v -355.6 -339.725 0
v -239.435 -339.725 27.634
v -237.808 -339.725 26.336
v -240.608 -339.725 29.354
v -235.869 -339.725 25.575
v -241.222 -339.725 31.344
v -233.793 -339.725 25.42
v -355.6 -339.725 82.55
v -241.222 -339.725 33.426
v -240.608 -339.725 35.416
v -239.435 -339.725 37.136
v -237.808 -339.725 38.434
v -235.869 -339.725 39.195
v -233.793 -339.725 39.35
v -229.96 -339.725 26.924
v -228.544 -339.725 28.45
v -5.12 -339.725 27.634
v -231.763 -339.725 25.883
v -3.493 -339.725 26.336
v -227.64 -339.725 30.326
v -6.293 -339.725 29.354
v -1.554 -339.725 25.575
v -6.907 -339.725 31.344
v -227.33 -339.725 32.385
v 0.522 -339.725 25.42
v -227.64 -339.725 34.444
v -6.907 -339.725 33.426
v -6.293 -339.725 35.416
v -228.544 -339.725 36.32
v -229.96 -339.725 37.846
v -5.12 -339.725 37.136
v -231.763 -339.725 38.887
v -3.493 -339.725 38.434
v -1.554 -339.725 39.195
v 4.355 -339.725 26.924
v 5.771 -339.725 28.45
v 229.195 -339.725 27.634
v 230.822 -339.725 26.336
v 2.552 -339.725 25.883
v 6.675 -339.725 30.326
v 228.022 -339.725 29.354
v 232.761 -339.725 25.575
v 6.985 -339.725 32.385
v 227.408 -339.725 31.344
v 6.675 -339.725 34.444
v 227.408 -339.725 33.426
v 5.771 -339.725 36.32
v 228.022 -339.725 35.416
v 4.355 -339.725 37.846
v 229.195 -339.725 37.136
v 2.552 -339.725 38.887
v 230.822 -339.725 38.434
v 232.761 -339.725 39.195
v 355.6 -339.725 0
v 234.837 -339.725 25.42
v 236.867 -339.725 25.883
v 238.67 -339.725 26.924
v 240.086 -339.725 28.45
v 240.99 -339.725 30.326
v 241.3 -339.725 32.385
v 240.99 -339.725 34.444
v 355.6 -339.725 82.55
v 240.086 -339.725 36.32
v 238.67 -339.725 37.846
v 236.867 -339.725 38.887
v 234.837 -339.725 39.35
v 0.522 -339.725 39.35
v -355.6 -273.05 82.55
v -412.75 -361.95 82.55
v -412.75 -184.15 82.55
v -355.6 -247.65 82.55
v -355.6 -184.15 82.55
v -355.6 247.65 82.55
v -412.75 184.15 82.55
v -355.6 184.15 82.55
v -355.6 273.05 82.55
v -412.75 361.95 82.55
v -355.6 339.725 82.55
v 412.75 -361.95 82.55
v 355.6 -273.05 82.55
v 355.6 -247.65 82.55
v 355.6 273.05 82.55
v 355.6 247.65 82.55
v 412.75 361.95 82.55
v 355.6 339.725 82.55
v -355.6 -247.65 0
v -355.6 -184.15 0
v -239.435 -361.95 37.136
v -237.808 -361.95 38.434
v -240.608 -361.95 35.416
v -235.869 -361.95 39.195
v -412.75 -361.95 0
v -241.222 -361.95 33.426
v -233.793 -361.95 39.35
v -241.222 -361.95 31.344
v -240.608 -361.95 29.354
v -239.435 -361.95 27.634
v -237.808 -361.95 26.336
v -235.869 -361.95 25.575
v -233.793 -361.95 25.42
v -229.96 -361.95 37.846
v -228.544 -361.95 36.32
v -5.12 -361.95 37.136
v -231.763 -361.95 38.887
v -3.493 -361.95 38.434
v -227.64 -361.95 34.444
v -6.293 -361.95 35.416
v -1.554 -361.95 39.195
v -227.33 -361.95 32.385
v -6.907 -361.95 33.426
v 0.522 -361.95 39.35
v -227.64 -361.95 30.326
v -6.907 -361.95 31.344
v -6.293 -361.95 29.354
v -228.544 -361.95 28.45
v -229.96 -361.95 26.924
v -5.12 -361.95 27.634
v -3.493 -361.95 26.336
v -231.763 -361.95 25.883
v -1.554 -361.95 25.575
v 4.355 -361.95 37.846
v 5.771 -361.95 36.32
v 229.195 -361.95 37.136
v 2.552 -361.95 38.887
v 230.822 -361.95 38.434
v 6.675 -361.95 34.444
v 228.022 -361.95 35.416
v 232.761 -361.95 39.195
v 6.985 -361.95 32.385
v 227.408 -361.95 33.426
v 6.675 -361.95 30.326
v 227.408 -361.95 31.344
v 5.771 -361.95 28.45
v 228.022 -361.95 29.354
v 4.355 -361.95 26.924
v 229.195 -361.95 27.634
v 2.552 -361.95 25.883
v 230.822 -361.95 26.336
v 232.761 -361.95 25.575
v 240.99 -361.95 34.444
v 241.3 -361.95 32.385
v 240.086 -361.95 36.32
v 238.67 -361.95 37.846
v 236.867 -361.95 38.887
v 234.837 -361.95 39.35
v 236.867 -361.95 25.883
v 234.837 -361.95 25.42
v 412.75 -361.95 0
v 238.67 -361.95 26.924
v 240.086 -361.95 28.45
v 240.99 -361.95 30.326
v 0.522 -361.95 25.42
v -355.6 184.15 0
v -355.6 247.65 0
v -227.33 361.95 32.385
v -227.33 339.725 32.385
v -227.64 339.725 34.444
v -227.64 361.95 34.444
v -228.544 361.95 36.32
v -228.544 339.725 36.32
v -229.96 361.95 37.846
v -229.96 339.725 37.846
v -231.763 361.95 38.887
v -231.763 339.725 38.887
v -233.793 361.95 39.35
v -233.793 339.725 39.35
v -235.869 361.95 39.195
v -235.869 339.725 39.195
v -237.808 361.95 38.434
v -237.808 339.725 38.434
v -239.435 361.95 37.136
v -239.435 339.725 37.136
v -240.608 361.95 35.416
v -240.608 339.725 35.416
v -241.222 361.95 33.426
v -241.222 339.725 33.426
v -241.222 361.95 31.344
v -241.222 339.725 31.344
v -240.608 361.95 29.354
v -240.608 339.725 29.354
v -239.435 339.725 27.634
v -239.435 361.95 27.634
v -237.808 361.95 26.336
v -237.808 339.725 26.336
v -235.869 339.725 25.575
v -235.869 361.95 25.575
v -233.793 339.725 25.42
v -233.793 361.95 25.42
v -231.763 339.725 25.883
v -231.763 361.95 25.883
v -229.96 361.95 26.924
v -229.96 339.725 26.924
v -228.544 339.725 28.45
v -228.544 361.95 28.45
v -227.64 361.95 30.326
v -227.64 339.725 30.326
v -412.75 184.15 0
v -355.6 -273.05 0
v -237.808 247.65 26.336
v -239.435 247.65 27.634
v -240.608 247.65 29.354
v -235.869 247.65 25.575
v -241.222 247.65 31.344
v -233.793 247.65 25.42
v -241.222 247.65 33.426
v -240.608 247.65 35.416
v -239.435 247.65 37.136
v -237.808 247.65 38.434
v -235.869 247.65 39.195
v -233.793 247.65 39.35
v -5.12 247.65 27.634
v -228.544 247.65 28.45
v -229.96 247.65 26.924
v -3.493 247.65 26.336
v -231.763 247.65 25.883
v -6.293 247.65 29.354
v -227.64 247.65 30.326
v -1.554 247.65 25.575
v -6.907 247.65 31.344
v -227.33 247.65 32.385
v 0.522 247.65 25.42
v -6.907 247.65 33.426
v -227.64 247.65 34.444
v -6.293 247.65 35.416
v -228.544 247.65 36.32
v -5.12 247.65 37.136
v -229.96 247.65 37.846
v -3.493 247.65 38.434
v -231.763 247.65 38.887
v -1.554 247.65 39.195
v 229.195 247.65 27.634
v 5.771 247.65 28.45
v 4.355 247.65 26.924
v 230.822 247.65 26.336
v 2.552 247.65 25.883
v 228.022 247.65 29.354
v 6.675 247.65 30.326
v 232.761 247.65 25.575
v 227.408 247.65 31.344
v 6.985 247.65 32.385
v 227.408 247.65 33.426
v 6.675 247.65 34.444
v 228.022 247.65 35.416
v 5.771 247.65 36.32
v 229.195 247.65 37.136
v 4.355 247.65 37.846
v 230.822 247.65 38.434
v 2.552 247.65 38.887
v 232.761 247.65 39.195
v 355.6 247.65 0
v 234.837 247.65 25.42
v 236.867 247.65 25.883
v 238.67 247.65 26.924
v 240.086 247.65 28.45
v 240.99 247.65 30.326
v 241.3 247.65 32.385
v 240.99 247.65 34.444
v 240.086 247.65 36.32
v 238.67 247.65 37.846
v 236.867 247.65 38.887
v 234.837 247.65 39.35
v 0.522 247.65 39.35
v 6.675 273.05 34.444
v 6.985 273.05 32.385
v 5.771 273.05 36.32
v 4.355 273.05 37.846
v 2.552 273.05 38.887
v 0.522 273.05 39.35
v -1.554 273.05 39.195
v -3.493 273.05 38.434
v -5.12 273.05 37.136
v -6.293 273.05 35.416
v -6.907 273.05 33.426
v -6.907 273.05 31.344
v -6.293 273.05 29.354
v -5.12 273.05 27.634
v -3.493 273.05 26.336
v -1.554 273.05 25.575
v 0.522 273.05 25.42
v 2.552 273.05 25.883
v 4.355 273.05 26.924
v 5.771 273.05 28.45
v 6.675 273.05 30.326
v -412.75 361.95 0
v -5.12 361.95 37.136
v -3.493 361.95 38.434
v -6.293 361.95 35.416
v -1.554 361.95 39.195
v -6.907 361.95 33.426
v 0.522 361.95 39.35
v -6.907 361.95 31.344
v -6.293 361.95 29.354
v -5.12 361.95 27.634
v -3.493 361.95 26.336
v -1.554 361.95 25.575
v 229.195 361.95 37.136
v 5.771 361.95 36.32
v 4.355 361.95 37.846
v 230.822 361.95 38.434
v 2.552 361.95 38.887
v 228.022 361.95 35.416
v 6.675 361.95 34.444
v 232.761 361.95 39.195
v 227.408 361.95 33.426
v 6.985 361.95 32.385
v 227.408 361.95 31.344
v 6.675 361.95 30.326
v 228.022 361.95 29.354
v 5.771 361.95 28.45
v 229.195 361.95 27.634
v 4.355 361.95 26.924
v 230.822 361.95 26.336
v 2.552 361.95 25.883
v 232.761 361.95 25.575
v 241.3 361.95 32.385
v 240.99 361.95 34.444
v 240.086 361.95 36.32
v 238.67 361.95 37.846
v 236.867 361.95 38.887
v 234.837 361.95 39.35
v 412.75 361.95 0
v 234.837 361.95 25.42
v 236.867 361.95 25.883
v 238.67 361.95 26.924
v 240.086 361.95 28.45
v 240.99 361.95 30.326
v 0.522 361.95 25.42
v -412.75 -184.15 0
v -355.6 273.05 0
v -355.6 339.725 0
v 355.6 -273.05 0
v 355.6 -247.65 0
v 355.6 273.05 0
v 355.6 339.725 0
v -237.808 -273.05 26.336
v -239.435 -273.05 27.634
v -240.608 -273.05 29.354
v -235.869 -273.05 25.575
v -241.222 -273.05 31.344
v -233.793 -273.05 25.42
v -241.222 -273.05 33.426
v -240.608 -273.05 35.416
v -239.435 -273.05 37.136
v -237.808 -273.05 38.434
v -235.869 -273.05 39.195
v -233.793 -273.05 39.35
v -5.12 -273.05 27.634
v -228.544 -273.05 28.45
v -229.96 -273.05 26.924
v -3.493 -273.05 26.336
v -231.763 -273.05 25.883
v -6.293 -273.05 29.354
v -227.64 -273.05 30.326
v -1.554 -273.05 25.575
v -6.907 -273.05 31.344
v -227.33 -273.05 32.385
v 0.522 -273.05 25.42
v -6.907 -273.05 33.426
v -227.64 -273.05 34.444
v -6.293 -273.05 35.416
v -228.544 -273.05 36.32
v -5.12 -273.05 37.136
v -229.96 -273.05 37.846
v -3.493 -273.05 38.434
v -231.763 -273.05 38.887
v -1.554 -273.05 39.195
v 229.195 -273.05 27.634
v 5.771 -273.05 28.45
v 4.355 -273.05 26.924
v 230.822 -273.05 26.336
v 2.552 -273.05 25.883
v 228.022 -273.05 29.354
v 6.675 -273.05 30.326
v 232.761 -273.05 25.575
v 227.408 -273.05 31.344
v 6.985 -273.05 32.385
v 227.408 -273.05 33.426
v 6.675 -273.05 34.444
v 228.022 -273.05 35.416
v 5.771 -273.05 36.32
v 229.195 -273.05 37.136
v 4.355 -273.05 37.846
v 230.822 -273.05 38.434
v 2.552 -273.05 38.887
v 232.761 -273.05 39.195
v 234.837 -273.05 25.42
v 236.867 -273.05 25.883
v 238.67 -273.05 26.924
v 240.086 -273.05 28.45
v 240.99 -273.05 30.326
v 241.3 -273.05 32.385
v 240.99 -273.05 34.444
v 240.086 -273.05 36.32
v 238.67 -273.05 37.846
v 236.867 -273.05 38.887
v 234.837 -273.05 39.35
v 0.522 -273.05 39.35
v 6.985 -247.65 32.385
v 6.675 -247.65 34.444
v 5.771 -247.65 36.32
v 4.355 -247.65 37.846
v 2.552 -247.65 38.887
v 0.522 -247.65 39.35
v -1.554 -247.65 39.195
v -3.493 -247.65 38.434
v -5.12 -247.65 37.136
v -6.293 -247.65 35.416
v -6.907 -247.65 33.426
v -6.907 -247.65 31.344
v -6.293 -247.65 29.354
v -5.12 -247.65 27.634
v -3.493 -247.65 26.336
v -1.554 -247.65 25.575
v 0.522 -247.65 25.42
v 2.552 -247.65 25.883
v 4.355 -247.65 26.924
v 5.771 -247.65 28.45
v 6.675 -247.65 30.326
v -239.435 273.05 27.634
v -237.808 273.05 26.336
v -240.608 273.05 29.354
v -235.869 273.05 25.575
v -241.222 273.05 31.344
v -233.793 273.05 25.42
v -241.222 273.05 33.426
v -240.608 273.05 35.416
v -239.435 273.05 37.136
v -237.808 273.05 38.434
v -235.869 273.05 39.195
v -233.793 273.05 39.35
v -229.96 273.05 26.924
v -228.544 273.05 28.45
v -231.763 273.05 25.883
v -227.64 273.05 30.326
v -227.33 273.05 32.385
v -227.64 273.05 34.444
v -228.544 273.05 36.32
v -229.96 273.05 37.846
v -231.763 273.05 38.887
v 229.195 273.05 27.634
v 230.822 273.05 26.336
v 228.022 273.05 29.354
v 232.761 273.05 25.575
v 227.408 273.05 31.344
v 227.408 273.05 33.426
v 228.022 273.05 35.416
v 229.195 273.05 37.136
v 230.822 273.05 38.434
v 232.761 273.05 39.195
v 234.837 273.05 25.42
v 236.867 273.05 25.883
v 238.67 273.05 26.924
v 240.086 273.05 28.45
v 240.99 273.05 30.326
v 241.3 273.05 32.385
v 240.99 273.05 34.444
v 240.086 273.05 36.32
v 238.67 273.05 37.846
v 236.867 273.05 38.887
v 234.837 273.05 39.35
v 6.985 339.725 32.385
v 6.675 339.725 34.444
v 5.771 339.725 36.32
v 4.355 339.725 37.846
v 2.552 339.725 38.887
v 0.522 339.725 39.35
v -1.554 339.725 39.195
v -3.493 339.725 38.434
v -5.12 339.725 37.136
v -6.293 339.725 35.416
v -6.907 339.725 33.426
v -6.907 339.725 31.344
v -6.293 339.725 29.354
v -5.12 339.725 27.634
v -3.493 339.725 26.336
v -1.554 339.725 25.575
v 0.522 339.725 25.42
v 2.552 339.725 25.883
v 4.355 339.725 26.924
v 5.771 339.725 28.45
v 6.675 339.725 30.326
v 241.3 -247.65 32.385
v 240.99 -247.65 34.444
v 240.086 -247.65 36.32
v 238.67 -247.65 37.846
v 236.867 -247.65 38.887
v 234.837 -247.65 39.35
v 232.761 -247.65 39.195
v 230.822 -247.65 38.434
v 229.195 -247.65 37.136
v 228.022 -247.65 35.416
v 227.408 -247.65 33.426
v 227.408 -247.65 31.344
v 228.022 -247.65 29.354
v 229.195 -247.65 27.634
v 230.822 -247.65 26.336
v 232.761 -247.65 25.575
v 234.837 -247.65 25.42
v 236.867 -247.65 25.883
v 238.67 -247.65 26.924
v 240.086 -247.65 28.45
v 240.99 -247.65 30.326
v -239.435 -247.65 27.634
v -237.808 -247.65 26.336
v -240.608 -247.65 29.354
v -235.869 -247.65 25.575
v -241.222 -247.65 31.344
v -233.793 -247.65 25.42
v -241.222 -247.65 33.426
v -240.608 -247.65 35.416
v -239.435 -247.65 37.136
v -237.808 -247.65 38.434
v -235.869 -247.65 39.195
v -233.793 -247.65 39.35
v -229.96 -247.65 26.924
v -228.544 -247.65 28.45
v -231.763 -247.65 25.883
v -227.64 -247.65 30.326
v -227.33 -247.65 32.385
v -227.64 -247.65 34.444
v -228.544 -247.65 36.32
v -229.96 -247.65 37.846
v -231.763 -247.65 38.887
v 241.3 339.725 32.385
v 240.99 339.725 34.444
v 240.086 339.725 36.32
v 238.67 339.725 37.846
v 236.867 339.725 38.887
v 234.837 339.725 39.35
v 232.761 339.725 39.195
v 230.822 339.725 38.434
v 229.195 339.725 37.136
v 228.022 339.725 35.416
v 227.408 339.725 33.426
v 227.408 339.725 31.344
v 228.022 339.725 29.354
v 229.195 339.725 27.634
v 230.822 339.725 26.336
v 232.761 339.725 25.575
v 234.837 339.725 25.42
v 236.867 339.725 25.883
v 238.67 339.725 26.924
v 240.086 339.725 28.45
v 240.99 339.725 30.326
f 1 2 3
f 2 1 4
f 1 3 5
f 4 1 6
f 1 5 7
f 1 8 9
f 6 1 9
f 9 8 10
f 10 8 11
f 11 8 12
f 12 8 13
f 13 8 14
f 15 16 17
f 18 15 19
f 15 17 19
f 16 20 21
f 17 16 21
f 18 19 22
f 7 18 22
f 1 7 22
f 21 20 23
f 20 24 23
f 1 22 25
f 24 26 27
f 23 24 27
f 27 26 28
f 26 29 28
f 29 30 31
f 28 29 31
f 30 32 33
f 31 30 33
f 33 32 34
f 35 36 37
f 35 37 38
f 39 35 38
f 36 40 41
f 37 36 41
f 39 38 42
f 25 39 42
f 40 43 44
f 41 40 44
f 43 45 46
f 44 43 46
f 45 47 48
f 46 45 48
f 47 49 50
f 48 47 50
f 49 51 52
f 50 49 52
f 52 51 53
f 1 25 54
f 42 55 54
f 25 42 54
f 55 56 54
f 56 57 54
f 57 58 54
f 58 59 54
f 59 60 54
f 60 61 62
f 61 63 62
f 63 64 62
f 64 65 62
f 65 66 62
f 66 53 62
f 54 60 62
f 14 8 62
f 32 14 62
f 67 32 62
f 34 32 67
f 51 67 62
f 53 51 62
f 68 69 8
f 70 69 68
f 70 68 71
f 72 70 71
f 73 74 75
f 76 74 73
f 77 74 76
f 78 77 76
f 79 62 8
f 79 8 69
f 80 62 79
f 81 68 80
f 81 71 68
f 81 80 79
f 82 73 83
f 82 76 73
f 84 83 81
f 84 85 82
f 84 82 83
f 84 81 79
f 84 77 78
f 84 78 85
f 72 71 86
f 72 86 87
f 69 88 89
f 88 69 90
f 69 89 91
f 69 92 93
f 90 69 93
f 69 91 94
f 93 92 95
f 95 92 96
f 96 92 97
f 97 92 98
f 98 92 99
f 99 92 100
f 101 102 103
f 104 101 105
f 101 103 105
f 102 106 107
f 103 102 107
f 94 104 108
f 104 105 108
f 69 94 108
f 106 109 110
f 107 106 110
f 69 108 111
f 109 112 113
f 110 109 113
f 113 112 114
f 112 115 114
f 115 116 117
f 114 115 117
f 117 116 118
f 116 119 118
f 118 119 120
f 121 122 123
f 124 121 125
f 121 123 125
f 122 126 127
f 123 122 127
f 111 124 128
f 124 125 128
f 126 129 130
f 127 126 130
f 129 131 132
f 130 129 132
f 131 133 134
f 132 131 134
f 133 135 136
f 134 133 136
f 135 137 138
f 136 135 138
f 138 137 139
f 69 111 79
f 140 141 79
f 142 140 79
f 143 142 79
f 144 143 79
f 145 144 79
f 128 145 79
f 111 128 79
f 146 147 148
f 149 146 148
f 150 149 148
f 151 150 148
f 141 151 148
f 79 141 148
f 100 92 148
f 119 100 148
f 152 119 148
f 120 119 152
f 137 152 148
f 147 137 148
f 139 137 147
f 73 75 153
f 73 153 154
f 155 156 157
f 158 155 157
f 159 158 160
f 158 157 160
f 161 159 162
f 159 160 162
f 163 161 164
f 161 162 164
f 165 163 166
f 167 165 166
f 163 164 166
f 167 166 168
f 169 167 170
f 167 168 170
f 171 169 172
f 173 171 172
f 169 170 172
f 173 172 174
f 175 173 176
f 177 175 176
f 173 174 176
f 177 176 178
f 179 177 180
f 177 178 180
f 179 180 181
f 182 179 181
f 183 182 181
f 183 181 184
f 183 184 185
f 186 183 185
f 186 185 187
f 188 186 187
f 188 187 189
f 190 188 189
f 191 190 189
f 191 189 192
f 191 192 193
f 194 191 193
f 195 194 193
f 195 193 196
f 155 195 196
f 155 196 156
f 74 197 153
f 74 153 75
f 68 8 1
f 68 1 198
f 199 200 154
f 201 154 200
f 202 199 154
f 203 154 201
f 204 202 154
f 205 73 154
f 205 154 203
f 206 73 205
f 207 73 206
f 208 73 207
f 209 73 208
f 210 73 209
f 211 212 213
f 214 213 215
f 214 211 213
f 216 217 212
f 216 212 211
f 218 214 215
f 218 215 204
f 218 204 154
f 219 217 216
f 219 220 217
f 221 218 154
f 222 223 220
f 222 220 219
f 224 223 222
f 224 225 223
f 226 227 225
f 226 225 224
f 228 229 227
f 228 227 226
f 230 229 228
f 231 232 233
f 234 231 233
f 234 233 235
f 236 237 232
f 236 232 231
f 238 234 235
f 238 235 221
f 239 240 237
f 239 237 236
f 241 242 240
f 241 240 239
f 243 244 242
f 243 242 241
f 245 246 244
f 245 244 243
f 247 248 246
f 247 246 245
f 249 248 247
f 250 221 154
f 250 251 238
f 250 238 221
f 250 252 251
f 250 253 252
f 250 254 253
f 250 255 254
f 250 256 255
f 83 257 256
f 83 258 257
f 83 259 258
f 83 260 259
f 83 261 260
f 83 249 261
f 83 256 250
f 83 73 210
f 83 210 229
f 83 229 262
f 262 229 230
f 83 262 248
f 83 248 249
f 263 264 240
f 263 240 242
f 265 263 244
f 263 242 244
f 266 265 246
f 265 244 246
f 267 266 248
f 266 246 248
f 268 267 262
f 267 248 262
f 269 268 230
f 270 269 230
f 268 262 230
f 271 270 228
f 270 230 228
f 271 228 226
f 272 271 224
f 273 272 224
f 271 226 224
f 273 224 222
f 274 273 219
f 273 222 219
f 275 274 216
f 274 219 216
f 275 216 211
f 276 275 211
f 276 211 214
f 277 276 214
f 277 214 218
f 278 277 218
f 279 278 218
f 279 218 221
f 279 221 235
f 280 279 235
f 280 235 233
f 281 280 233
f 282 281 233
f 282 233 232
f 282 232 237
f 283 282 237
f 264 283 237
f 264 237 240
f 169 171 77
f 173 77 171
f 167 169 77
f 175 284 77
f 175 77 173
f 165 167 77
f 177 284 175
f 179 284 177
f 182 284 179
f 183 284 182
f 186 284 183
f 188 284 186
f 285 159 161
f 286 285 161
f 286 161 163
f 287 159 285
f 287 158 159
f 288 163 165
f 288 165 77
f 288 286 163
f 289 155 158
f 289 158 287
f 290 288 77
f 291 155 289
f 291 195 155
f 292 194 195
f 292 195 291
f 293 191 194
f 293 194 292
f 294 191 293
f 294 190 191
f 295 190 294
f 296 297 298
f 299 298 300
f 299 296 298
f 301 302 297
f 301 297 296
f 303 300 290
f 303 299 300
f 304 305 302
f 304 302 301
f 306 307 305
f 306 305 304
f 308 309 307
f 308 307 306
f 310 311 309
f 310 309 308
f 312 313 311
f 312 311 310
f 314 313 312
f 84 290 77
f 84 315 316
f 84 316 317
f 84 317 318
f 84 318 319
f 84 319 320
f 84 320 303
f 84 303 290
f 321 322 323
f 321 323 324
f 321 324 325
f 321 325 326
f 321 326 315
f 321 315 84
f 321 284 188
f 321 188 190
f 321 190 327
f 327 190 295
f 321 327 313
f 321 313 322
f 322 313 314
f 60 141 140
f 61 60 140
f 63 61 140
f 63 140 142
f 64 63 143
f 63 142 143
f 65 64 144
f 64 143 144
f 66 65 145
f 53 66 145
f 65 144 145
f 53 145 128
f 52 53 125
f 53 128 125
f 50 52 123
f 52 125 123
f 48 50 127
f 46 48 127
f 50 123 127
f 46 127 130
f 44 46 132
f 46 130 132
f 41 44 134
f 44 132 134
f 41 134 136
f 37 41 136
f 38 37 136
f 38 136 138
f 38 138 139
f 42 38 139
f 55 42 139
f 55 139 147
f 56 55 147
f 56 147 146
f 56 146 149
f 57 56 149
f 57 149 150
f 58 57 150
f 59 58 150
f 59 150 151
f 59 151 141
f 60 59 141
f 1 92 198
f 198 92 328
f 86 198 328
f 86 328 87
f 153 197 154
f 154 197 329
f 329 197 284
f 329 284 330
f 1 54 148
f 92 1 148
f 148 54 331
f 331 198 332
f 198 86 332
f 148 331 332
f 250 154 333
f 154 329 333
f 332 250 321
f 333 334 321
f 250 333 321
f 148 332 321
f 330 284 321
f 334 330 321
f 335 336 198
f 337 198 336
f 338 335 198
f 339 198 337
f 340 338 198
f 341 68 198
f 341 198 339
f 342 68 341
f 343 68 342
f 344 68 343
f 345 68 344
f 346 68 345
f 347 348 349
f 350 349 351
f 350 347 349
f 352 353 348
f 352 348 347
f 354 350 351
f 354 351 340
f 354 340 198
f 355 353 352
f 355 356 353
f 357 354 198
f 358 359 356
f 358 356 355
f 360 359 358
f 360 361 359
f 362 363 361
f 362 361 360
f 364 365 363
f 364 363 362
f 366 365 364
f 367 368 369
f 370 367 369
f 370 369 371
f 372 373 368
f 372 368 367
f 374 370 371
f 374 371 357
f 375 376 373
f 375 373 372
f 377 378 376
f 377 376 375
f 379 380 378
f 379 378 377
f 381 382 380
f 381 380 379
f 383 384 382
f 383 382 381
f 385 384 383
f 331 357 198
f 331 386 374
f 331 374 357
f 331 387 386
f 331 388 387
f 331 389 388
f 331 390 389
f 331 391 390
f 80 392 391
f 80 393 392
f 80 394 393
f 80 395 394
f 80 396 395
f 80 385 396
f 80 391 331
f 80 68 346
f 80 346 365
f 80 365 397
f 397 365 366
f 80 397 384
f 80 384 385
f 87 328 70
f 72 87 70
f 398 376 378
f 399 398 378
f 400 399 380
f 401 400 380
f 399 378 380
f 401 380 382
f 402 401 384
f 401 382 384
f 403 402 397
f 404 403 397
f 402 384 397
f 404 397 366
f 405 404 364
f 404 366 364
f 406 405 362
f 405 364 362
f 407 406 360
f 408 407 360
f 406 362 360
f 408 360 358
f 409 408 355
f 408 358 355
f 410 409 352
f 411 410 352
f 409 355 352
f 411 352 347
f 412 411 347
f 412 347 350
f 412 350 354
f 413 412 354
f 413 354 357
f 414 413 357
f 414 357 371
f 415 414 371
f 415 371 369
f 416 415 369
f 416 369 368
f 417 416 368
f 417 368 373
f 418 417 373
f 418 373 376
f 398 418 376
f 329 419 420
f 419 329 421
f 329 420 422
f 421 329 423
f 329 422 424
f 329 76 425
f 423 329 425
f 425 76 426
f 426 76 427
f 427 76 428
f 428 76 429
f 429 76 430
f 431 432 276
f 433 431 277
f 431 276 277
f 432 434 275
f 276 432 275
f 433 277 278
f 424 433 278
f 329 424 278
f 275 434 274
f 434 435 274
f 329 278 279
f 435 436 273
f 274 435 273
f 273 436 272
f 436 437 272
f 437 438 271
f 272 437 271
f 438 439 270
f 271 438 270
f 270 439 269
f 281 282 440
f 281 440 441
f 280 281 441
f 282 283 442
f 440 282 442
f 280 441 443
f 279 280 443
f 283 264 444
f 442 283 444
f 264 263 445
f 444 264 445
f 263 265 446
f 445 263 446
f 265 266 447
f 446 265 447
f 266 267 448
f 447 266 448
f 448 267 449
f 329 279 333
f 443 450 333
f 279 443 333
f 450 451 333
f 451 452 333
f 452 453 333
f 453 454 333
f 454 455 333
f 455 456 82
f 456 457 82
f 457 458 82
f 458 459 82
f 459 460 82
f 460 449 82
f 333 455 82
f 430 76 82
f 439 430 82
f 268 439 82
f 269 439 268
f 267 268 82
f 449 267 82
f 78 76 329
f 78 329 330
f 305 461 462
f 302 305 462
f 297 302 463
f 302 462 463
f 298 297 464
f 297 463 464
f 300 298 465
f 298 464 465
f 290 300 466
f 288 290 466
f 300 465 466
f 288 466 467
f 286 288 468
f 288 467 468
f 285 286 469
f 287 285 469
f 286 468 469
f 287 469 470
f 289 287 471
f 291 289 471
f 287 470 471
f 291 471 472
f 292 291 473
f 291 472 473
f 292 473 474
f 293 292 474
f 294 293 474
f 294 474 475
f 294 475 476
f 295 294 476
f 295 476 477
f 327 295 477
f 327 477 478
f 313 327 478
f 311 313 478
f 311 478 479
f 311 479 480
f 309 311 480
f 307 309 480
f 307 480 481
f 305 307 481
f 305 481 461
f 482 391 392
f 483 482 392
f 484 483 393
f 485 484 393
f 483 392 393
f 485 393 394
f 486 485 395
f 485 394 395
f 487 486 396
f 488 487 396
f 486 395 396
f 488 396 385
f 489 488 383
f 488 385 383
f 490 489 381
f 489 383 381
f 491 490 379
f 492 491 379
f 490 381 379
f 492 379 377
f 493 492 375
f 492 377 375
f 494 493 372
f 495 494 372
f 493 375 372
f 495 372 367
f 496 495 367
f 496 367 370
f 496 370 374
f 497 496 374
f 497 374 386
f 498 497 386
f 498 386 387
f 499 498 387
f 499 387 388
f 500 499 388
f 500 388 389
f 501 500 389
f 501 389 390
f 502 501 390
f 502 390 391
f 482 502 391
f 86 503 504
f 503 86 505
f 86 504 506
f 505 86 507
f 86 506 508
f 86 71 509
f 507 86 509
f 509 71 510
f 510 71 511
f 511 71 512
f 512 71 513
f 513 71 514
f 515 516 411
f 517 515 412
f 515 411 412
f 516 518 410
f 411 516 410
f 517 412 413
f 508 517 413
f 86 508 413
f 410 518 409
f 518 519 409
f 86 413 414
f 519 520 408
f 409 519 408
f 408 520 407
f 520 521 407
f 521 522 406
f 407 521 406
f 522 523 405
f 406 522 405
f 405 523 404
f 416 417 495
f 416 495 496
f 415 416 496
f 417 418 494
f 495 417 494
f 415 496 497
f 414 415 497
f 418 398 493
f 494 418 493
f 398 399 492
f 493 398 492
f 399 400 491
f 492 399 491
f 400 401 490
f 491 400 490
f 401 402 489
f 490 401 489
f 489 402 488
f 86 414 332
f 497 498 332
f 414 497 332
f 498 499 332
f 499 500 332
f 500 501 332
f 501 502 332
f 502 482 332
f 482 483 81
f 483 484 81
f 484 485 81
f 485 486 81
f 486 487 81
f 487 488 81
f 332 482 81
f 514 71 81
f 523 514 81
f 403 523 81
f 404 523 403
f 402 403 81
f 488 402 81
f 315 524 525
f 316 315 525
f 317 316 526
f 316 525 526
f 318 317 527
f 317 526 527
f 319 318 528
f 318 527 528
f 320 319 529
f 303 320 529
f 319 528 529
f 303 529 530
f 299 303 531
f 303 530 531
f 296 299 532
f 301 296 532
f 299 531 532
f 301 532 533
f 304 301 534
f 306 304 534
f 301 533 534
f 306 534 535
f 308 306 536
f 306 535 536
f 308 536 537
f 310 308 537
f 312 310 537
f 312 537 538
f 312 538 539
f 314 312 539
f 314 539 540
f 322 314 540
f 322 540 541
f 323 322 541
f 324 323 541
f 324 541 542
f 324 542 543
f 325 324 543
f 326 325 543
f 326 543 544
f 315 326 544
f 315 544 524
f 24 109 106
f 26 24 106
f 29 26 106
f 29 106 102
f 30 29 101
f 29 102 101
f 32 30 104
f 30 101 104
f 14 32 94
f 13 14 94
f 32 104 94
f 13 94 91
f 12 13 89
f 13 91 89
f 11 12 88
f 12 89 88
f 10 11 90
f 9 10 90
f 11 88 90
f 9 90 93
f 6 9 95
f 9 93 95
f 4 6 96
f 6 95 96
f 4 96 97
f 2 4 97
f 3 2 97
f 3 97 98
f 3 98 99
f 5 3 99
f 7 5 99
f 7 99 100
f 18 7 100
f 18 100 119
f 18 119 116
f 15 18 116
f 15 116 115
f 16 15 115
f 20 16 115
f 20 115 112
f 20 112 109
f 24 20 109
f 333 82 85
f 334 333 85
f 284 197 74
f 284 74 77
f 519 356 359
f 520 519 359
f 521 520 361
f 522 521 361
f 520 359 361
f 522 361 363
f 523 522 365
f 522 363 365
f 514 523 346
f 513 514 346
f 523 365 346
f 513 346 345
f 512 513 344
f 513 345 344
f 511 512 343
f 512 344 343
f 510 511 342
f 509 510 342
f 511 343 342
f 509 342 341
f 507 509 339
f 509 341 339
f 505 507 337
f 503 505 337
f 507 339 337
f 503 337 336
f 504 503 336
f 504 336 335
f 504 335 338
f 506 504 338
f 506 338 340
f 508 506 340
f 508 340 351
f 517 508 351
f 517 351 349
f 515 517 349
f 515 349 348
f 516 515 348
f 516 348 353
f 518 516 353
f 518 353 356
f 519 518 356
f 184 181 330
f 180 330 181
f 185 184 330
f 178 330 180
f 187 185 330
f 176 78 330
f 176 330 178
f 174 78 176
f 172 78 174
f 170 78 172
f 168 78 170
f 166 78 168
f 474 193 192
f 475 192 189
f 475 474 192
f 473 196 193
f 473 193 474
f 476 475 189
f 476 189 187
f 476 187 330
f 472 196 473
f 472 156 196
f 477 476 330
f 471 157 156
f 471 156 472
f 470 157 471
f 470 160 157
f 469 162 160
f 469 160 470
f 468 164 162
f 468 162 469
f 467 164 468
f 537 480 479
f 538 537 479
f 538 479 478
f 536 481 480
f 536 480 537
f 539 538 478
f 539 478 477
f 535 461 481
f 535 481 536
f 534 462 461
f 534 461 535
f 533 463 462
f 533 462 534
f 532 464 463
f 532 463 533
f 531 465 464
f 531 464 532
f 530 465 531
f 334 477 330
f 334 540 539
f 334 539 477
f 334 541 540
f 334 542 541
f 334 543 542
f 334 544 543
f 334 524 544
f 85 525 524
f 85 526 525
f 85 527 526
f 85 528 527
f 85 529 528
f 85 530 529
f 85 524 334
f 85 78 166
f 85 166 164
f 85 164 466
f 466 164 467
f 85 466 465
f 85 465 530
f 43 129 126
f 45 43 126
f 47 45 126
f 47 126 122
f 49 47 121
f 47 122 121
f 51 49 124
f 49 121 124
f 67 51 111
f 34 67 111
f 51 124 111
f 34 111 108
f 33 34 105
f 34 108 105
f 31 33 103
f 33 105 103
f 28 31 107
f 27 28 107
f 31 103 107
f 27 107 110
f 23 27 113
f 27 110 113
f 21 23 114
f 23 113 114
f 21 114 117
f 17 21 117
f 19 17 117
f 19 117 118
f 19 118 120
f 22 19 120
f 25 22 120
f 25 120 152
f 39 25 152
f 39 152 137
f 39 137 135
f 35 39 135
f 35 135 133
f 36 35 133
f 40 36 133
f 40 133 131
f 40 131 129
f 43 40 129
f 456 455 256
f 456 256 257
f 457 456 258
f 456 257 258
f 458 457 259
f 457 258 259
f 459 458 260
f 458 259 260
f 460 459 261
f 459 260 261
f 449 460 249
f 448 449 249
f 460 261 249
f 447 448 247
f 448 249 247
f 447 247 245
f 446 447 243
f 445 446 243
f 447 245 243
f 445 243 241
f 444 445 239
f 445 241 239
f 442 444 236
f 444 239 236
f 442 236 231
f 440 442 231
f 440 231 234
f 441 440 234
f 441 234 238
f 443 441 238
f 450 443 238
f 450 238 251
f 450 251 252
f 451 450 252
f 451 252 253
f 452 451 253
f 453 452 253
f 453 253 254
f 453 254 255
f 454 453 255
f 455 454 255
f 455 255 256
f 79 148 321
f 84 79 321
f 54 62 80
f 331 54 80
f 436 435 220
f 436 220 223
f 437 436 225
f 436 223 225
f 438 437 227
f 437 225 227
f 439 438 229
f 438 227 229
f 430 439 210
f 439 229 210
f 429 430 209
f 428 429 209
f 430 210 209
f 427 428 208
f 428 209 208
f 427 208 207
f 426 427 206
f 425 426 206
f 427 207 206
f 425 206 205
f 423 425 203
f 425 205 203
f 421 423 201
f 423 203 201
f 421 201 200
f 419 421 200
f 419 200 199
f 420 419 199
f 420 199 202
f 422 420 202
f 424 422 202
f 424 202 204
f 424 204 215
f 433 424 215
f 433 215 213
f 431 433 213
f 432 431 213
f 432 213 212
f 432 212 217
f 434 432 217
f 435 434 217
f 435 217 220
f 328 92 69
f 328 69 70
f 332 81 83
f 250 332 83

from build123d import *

# Parameters (mm, degrees)
F0_W      = 825.5
F0_H      = 723.9
F1_DEPTH  = 82.55
F2_W      = 711.2
F2_H      = 495.3
F3_DEPTH  = 82.55
F4_W      = 711.2
F4_H      = 66.675
F5_DEPTH  = 82.55
F6_W      = 711.2
F6_H      = 66.675
F7_DEPTH  = 82.55
F8_W      = 368.3
F8_H      = 82.55
F9_DEPTH  = 57.15
F10_R     = 6.985
F11_DEPTH = 762


with BuildPart() as f1:
    # F0 (on Top) → F1 (new body)
    with BuildSketch(Plane.XY):
        Rectangle(F0_W, F0_H)
    extrude(amount=F1_DEPTH)

    # F2 (on face) → F3 (cut)
    with BuildSketch(Plane.XY.offset(82.55)):
        Rectangle(F2_W, F2_H)
    extrude(amount=-F3_DEPTH, mode=Mode.SUBTRACT)

    # F4 (on face) → F5 (cut)
    with BuildSketch(Plane.XY.offset(82.55)):
        with Locations((0, 306.3875)):
            Rectangle(F4_W, F4_H)
    extrude(amount=-F5_DEPTH, mode=Mode.SUBTRACT)

    # F6 (on face) → F7 (cut)
    with BuildSketch(Plane.XY.offset(82.55)):
        with Locations((0, -306.3875)):
            Rectangle(F6_W, F6_H)
    extrude(amount=-F7_DEPTH, mode=Mode.SUBTRACT)

    # F8 (on face) → F9 (cut)
    with BuildSketch(Plane(origin=(-412.75, 0, 0), x_dir=(0, -1, 0), z_dir=(-1, 0, 0))):
        with Locations((0, 41.275)):
            Rectangle(F8_W, F8_H)
    extrude(amount=-F9_DEPTH, mode=Mode.SUBTRACT)

    # F10 (on face) → F11 (cut)
    with BuildSketch(Plane.XZ.offset(361.95)):
        with Locations((0, 32.385)):
            Circle(F10_R)
        with Locations((234.315, 32.385)):
            Circle(F10_R)
        with Locations((-234.315, 32.385)):
            Circle(F10_R)
    extrude(amount=-F11_DEPTH, mode=Mode.SUBTRACT)


solid = f1.part
